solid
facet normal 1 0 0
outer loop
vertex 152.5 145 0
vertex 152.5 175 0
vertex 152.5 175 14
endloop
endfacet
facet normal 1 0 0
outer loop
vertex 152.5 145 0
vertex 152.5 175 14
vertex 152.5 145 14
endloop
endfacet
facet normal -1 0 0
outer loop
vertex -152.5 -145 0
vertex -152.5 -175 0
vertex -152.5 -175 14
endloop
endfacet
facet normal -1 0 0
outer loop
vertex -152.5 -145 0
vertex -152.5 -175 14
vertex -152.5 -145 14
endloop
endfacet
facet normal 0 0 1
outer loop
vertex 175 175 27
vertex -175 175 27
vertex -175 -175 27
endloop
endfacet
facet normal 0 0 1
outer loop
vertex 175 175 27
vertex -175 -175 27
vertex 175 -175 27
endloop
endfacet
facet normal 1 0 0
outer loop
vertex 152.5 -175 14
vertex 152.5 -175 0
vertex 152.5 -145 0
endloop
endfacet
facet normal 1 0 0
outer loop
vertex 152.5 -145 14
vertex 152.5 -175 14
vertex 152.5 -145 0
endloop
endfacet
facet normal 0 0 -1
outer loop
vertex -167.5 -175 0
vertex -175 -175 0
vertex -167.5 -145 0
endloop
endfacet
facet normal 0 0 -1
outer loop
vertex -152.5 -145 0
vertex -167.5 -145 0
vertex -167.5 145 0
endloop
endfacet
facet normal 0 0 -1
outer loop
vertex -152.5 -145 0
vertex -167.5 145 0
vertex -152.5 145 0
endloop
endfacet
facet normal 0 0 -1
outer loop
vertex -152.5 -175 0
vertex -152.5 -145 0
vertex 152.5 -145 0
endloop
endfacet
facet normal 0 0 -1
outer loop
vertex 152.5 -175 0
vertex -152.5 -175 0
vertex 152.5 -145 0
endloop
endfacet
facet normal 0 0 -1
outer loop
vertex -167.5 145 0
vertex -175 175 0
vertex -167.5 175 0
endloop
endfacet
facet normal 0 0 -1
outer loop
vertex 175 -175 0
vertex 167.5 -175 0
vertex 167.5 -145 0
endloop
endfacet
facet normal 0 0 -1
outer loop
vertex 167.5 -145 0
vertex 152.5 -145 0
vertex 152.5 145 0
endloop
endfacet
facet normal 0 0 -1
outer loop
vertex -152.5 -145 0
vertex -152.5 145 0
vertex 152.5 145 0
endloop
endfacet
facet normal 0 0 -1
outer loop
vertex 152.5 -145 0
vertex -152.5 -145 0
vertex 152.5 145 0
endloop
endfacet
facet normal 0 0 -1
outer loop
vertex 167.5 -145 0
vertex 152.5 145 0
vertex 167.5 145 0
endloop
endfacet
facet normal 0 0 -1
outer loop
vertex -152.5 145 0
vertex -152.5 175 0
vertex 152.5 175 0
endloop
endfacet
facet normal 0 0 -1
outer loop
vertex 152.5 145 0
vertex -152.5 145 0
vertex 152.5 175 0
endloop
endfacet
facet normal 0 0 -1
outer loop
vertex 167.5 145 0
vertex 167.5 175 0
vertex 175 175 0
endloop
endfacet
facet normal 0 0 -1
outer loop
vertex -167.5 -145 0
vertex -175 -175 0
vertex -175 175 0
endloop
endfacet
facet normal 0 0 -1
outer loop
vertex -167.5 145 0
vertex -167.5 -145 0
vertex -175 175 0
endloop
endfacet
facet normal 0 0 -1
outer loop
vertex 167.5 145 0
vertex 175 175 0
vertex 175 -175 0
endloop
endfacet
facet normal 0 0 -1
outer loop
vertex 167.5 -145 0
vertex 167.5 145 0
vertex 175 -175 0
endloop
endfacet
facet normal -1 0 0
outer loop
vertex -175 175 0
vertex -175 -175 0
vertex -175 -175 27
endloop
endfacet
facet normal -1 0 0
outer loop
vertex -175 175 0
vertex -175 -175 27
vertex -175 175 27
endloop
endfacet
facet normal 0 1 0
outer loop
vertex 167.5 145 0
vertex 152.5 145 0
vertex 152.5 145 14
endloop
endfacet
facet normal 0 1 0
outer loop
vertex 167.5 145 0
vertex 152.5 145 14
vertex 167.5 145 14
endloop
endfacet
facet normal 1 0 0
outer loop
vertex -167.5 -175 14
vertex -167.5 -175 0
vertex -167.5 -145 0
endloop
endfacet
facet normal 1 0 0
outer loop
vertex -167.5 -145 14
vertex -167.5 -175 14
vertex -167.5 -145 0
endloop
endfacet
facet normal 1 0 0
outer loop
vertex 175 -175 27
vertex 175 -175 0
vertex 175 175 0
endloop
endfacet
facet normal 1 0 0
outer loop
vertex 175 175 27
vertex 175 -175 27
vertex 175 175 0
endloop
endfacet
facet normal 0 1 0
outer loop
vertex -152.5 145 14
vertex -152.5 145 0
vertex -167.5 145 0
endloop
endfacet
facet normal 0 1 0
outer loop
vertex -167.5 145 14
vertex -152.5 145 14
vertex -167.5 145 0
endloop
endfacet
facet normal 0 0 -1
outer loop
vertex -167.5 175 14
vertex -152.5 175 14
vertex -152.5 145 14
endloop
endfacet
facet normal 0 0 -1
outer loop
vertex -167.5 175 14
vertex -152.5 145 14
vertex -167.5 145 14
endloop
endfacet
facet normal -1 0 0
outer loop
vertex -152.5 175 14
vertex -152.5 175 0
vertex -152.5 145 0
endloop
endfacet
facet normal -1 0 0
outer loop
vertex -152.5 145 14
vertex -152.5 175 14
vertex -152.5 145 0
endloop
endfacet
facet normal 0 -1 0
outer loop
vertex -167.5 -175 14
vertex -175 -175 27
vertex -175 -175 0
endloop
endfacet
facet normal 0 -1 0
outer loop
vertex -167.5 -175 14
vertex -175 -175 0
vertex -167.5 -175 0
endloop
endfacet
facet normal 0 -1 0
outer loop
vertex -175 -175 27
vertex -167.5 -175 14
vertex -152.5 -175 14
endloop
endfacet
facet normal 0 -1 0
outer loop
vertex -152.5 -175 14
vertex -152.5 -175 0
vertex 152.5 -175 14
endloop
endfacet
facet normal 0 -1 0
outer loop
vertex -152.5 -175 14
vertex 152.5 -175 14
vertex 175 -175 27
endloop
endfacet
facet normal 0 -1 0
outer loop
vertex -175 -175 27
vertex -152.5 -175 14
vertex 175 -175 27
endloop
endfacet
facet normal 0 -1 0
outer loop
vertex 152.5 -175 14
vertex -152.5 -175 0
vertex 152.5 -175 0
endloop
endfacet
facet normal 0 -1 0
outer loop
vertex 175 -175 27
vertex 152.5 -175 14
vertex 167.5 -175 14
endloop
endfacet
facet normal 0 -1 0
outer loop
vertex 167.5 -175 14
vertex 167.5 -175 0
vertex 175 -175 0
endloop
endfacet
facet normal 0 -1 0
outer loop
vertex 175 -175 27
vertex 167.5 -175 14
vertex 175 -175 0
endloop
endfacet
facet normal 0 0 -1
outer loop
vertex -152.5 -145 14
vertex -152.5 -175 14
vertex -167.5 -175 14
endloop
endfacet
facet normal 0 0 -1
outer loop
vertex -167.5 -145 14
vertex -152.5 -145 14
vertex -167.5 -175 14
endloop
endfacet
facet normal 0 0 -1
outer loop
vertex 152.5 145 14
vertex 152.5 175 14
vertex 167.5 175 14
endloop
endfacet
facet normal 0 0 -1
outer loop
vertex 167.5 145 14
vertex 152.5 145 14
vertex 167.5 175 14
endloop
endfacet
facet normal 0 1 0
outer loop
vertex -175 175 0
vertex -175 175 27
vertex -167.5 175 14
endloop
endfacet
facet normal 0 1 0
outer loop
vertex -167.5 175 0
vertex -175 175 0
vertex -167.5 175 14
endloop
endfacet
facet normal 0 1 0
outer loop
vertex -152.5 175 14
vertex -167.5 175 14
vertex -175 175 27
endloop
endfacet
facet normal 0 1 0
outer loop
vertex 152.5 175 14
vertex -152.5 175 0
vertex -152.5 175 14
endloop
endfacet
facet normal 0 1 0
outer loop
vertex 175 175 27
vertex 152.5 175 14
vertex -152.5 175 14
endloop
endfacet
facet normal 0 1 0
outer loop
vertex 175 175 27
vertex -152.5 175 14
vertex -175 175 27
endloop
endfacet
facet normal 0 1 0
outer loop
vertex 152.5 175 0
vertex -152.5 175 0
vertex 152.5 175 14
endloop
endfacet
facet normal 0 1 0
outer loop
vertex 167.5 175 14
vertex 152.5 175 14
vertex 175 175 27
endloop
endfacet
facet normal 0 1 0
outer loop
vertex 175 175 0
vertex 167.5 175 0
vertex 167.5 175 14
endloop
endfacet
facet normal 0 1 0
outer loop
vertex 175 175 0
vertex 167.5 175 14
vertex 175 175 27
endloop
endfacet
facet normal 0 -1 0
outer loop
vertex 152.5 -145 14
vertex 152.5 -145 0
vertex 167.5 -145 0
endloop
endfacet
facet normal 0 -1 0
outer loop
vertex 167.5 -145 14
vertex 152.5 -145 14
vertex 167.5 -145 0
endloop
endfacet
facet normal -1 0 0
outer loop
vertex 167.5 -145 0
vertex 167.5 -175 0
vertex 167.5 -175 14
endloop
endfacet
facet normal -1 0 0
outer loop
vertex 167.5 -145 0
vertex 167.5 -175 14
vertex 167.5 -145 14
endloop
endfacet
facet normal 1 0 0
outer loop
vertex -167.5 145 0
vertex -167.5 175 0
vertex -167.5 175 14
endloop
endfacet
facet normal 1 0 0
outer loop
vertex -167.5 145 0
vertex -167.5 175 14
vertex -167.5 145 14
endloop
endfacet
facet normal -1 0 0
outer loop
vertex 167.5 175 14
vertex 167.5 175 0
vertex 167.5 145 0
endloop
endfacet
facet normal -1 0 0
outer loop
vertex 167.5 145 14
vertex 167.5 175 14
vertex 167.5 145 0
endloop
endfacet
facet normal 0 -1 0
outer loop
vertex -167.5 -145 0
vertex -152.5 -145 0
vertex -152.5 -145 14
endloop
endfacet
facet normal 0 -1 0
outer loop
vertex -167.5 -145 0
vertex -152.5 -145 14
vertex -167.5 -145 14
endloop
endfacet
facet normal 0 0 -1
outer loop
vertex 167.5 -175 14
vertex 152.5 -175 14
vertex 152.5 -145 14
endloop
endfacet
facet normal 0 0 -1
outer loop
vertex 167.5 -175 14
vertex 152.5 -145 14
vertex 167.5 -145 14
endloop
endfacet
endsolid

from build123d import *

# Parameters (mm, degrees)
SKETCH_W                = 350
SKETCH_H                = 350
PAD_DEPTH               = 27
SKETCH003_W             = 15
SKETCH003_H             = 30
POCKET_DEPTH            = 14
SKETCH003_MIRRORED_2_W  = 15
SKETCH003_MIRRORED_2_H  = 30
POCKET_MIRRORED_2_DEPTH = 14


with BuildPart() as part:
    # Sketch → Pad (new body)
    with BuildSketch(Plane.XY):
        Rectangle(SKETCH_W, SKETCH_H)
    extrude(amount=PAD_DEPTH)

    # Sketch003 (on Face5 of Pad) → Pocket (cut)
    with BuildSketch(Plane(origin=(0, 0, 0), x_dir=(1, 0, 0), z_dir=(0, 0, -1))):
        with Locations((160, -160)):
            Rectangle(SKETCH003_W, SKETCH003_H)
    pocket = extrude(amount=-POCKET_DEPTH, mode=Mode.SUBTRACT)

    # Sketch003 Mirrored 2 → Pocket Mirrored 2 (cut)
    with BuildSketch(Plane(origin=(0, 0, 0), x_dir=(-1, 0, 0), z_dir=(0, 0, 1))):
        with Locations((160, -160)):
            Rectangle(SKETCH003_MIRRORED_2_W, SKETCH003_MIRRORED_2_H)
    pocket_mirrored_2 = extrude(amount=POCKET_MIRRORED_2_DEPTH, mode=Mode.SUBTRACT)

    # Mirrored001: Pocket, Pocket Mirrored 2 across Sketch003 H_Axis
    add(pocket.mirror(Plane(origin=(0, 0, 0), x_dir=(0, 0, -1), z_dir=(0, -1, 0))), mode=Mode.SUBTRACT)
    add(pocket_mirrored_2.mirror(Plane(origin=(0, 0, 0), x_dir=(0, 0, -1), z_dir=(0, -1, 0))), mode=Mode.SUBTRACT)


solid = part.part
